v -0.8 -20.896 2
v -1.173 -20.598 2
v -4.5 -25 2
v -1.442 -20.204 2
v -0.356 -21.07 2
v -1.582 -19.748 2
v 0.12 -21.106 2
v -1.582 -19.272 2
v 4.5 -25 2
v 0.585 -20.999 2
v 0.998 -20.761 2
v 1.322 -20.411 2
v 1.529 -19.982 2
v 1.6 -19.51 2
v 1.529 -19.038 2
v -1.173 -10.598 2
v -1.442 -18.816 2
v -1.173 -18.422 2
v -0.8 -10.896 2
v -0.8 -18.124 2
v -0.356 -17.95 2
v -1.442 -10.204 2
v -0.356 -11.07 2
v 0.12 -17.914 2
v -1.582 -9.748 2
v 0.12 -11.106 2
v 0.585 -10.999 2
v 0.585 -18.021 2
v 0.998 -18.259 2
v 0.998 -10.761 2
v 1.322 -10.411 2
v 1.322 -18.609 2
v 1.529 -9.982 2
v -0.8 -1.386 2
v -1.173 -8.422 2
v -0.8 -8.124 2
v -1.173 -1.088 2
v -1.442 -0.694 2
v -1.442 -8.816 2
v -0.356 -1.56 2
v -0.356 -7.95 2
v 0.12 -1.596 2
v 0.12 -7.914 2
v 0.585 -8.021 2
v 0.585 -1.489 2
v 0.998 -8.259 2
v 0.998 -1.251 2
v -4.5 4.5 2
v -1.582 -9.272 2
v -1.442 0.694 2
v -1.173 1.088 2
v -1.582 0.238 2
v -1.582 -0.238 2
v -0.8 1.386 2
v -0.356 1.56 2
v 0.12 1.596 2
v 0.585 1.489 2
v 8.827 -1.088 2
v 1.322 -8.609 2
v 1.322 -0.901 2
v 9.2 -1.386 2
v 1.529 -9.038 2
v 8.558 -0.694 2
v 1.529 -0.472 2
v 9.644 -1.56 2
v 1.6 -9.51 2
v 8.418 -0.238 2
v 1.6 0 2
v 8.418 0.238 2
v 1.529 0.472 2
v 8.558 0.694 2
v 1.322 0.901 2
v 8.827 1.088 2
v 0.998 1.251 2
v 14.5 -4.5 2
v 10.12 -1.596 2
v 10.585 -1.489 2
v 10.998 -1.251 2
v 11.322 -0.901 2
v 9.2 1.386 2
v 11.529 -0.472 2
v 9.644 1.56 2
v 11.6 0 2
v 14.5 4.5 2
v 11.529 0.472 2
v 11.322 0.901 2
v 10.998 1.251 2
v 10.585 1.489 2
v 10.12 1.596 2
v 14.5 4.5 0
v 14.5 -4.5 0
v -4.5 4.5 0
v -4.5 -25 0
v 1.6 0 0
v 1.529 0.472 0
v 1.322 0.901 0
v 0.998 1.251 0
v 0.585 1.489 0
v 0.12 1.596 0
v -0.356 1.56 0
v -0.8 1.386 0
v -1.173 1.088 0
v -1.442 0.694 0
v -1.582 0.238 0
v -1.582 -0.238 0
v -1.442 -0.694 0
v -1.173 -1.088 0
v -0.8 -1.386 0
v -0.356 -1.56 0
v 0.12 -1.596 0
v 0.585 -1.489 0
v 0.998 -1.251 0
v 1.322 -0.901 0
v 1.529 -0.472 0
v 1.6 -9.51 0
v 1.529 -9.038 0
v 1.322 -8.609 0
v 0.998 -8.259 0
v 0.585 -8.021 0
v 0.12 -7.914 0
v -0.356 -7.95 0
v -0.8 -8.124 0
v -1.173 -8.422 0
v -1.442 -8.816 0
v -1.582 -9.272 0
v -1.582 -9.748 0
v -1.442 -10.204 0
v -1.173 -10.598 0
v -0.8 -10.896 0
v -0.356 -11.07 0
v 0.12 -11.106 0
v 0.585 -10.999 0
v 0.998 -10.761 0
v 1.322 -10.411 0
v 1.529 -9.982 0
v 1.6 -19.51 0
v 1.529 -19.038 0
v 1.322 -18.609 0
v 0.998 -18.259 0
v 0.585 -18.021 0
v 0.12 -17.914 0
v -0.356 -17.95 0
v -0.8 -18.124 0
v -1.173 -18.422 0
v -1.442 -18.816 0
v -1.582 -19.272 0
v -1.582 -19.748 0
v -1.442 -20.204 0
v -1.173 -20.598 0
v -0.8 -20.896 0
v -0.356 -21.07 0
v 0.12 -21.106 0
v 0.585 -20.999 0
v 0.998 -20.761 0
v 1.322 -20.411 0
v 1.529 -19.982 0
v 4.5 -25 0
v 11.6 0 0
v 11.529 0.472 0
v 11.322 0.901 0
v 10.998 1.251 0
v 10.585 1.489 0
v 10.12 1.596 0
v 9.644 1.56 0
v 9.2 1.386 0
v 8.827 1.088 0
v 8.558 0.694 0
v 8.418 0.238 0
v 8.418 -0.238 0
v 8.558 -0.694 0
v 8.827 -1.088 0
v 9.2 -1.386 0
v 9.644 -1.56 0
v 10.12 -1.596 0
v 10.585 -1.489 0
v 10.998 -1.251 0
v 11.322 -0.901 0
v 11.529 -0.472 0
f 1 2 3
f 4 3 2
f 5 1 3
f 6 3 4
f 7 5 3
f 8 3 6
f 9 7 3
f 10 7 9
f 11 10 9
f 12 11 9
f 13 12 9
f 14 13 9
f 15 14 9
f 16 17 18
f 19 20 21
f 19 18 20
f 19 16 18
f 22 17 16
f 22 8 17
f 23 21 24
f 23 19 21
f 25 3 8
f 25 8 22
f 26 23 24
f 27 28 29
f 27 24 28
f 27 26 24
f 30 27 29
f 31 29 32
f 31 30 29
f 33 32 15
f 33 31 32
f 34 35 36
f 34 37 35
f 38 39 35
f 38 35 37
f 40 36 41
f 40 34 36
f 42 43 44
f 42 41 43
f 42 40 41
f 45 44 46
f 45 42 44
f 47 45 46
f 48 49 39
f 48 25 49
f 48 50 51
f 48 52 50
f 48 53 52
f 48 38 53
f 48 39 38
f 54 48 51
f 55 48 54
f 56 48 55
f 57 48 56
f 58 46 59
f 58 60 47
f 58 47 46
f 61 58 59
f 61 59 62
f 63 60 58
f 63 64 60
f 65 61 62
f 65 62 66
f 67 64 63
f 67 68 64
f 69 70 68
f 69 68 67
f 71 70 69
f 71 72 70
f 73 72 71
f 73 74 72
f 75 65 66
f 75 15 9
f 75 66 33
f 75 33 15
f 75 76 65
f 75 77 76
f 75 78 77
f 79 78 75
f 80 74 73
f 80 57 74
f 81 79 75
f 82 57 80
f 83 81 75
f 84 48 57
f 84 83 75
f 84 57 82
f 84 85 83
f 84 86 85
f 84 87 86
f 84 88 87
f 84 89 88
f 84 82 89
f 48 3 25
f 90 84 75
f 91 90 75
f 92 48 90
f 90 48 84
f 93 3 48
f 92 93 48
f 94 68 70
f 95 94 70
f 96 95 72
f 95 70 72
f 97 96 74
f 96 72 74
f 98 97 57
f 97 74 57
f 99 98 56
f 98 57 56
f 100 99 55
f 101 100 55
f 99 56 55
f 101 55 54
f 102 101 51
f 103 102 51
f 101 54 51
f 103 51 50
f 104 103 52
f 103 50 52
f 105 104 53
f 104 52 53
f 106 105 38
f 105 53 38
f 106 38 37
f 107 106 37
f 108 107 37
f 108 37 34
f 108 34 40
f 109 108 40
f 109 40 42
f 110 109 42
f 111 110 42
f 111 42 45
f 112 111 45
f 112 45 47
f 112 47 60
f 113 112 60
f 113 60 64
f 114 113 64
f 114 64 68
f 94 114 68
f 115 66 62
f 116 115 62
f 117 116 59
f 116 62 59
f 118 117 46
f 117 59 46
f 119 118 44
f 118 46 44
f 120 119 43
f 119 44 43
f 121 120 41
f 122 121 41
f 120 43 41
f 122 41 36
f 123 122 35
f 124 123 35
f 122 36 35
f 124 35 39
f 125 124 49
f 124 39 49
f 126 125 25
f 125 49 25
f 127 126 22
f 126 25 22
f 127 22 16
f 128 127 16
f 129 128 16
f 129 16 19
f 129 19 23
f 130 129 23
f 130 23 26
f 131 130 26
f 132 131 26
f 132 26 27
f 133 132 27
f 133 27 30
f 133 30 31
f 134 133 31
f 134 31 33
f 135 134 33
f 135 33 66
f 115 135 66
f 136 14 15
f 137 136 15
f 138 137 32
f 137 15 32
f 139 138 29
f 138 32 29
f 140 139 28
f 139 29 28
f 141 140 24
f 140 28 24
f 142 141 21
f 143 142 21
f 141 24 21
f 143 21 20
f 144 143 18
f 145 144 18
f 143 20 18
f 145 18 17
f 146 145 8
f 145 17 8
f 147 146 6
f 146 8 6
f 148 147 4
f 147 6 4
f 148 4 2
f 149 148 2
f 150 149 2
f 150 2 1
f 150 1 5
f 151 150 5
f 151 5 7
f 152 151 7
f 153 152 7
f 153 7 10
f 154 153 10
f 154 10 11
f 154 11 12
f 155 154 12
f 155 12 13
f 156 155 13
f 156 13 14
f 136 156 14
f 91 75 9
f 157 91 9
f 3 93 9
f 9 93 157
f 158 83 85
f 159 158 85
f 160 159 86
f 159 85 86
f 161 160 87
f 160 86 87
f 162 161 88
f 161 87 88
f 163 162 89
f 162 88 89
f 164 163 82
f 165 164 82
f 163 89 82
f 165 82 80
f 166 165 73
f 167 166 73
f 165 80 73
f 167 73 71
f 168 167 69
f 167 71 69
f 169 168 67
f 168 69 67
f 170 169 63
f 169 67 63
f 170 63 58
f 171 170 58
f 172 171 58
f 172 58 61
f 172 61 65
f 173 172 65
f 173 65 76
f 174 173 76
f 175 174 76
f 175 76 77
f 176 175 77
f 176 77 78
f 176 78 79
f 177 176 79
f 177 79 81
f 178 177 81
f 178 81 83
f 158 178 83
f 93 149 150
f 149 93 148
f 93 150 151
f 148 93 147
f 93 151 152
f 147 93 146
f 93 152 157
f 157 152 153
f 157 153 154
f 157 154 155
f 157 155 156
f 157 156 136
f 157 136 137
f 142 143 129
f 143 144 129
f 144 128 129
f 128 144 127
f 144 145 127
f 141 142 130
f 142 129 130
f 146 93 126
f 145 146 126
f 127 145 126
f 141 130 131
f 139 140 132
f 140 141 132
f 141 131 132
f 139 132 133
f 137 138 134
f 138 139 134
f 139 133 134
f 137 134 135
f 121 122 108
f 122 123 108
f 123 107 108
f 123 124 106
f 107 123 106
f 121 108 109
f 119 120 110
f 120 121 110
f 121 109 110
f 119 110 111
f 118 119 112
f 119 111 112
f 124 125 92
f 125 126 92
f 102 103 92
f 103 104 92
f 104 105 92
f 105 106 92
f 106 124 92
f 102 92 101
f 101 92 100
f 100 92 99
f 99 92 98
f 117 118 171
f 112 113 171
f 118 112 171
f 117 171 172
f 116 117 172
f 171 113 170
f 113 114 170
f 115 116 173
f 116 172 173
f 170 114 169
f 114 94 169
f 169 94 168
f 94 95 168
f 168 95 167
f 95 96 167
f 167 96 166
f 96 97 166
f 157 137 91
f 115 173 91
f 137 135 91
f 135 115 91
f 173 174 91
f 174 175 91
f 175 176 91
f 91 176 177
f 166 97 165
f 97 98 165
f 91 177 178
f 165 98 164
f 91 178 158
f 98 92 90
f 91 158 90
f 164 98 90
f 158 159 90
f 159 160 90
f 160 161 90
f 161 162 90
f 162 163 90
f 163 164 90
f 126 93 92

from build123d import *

# Parameters (mm, degrees)
SKETCH_1_W          = 50
SKETCH_1_H          = 50
EXTRUDE_1_DEPTH     = 2
SKETCH_2_R          = 1.6
CUT_EXTRUDE_1_DEPTH = 10
SKETCH_3_W          = 76.549088161
SKETCH_3_H          = 63.496312915
CUT_EXTRUDE_3_DEPTH = 10


with BuildPart() as part:
    # ｽｹｯﾁ1 → ﾎﾞｽ - 押し出し1 (new body)
    with BuildSketch(Plane.XY):
        Rectangle(SKETCH_1_W, SKETCH_1_H)
    extrude(amount=EXTRUDE_1_DEPTH)

    # ｽｹｯﾁ2 → ｶｯﾄ - 押し出し1 (cut)
    with BuildSketch(Plane.XY.offset(2)):
        Circle(SKETCH_2_R)
        with Locations((0, -9.51)):
            Circle(SKETCH_2_R)
        with Locations((0, -19.51)):
            Circle(SKETCH_2_R)
        with Locations((10, 0)):
            Circle(SKETCH_2_R)
    extrude(amount=-CUT_EXTRUDE_1_DEPTH, mode=Mode.SUBTRACT)

    # ｽｹｯﾁ3 → ｶｯﾄ - 押し出し3 (cut)
    with BuildSketch(Plane.XY.offset(2)):
        with Locations((-0.951764861, 3.501134841)):
            Rectangle(SKETCH_3_W, SKETCH_3_H)
        Polygon((14.5, -4.5), (4.5, -25), (-4.5, -25), (-4.5, 4.5), (14.5, 4.5), align=None, mode=Mode.SUBTRACT)
    extrude(amount=-CUT_EXTRUDE_3_DEPTH, mode=Mode.SUBTRACT)


solid = part.part
